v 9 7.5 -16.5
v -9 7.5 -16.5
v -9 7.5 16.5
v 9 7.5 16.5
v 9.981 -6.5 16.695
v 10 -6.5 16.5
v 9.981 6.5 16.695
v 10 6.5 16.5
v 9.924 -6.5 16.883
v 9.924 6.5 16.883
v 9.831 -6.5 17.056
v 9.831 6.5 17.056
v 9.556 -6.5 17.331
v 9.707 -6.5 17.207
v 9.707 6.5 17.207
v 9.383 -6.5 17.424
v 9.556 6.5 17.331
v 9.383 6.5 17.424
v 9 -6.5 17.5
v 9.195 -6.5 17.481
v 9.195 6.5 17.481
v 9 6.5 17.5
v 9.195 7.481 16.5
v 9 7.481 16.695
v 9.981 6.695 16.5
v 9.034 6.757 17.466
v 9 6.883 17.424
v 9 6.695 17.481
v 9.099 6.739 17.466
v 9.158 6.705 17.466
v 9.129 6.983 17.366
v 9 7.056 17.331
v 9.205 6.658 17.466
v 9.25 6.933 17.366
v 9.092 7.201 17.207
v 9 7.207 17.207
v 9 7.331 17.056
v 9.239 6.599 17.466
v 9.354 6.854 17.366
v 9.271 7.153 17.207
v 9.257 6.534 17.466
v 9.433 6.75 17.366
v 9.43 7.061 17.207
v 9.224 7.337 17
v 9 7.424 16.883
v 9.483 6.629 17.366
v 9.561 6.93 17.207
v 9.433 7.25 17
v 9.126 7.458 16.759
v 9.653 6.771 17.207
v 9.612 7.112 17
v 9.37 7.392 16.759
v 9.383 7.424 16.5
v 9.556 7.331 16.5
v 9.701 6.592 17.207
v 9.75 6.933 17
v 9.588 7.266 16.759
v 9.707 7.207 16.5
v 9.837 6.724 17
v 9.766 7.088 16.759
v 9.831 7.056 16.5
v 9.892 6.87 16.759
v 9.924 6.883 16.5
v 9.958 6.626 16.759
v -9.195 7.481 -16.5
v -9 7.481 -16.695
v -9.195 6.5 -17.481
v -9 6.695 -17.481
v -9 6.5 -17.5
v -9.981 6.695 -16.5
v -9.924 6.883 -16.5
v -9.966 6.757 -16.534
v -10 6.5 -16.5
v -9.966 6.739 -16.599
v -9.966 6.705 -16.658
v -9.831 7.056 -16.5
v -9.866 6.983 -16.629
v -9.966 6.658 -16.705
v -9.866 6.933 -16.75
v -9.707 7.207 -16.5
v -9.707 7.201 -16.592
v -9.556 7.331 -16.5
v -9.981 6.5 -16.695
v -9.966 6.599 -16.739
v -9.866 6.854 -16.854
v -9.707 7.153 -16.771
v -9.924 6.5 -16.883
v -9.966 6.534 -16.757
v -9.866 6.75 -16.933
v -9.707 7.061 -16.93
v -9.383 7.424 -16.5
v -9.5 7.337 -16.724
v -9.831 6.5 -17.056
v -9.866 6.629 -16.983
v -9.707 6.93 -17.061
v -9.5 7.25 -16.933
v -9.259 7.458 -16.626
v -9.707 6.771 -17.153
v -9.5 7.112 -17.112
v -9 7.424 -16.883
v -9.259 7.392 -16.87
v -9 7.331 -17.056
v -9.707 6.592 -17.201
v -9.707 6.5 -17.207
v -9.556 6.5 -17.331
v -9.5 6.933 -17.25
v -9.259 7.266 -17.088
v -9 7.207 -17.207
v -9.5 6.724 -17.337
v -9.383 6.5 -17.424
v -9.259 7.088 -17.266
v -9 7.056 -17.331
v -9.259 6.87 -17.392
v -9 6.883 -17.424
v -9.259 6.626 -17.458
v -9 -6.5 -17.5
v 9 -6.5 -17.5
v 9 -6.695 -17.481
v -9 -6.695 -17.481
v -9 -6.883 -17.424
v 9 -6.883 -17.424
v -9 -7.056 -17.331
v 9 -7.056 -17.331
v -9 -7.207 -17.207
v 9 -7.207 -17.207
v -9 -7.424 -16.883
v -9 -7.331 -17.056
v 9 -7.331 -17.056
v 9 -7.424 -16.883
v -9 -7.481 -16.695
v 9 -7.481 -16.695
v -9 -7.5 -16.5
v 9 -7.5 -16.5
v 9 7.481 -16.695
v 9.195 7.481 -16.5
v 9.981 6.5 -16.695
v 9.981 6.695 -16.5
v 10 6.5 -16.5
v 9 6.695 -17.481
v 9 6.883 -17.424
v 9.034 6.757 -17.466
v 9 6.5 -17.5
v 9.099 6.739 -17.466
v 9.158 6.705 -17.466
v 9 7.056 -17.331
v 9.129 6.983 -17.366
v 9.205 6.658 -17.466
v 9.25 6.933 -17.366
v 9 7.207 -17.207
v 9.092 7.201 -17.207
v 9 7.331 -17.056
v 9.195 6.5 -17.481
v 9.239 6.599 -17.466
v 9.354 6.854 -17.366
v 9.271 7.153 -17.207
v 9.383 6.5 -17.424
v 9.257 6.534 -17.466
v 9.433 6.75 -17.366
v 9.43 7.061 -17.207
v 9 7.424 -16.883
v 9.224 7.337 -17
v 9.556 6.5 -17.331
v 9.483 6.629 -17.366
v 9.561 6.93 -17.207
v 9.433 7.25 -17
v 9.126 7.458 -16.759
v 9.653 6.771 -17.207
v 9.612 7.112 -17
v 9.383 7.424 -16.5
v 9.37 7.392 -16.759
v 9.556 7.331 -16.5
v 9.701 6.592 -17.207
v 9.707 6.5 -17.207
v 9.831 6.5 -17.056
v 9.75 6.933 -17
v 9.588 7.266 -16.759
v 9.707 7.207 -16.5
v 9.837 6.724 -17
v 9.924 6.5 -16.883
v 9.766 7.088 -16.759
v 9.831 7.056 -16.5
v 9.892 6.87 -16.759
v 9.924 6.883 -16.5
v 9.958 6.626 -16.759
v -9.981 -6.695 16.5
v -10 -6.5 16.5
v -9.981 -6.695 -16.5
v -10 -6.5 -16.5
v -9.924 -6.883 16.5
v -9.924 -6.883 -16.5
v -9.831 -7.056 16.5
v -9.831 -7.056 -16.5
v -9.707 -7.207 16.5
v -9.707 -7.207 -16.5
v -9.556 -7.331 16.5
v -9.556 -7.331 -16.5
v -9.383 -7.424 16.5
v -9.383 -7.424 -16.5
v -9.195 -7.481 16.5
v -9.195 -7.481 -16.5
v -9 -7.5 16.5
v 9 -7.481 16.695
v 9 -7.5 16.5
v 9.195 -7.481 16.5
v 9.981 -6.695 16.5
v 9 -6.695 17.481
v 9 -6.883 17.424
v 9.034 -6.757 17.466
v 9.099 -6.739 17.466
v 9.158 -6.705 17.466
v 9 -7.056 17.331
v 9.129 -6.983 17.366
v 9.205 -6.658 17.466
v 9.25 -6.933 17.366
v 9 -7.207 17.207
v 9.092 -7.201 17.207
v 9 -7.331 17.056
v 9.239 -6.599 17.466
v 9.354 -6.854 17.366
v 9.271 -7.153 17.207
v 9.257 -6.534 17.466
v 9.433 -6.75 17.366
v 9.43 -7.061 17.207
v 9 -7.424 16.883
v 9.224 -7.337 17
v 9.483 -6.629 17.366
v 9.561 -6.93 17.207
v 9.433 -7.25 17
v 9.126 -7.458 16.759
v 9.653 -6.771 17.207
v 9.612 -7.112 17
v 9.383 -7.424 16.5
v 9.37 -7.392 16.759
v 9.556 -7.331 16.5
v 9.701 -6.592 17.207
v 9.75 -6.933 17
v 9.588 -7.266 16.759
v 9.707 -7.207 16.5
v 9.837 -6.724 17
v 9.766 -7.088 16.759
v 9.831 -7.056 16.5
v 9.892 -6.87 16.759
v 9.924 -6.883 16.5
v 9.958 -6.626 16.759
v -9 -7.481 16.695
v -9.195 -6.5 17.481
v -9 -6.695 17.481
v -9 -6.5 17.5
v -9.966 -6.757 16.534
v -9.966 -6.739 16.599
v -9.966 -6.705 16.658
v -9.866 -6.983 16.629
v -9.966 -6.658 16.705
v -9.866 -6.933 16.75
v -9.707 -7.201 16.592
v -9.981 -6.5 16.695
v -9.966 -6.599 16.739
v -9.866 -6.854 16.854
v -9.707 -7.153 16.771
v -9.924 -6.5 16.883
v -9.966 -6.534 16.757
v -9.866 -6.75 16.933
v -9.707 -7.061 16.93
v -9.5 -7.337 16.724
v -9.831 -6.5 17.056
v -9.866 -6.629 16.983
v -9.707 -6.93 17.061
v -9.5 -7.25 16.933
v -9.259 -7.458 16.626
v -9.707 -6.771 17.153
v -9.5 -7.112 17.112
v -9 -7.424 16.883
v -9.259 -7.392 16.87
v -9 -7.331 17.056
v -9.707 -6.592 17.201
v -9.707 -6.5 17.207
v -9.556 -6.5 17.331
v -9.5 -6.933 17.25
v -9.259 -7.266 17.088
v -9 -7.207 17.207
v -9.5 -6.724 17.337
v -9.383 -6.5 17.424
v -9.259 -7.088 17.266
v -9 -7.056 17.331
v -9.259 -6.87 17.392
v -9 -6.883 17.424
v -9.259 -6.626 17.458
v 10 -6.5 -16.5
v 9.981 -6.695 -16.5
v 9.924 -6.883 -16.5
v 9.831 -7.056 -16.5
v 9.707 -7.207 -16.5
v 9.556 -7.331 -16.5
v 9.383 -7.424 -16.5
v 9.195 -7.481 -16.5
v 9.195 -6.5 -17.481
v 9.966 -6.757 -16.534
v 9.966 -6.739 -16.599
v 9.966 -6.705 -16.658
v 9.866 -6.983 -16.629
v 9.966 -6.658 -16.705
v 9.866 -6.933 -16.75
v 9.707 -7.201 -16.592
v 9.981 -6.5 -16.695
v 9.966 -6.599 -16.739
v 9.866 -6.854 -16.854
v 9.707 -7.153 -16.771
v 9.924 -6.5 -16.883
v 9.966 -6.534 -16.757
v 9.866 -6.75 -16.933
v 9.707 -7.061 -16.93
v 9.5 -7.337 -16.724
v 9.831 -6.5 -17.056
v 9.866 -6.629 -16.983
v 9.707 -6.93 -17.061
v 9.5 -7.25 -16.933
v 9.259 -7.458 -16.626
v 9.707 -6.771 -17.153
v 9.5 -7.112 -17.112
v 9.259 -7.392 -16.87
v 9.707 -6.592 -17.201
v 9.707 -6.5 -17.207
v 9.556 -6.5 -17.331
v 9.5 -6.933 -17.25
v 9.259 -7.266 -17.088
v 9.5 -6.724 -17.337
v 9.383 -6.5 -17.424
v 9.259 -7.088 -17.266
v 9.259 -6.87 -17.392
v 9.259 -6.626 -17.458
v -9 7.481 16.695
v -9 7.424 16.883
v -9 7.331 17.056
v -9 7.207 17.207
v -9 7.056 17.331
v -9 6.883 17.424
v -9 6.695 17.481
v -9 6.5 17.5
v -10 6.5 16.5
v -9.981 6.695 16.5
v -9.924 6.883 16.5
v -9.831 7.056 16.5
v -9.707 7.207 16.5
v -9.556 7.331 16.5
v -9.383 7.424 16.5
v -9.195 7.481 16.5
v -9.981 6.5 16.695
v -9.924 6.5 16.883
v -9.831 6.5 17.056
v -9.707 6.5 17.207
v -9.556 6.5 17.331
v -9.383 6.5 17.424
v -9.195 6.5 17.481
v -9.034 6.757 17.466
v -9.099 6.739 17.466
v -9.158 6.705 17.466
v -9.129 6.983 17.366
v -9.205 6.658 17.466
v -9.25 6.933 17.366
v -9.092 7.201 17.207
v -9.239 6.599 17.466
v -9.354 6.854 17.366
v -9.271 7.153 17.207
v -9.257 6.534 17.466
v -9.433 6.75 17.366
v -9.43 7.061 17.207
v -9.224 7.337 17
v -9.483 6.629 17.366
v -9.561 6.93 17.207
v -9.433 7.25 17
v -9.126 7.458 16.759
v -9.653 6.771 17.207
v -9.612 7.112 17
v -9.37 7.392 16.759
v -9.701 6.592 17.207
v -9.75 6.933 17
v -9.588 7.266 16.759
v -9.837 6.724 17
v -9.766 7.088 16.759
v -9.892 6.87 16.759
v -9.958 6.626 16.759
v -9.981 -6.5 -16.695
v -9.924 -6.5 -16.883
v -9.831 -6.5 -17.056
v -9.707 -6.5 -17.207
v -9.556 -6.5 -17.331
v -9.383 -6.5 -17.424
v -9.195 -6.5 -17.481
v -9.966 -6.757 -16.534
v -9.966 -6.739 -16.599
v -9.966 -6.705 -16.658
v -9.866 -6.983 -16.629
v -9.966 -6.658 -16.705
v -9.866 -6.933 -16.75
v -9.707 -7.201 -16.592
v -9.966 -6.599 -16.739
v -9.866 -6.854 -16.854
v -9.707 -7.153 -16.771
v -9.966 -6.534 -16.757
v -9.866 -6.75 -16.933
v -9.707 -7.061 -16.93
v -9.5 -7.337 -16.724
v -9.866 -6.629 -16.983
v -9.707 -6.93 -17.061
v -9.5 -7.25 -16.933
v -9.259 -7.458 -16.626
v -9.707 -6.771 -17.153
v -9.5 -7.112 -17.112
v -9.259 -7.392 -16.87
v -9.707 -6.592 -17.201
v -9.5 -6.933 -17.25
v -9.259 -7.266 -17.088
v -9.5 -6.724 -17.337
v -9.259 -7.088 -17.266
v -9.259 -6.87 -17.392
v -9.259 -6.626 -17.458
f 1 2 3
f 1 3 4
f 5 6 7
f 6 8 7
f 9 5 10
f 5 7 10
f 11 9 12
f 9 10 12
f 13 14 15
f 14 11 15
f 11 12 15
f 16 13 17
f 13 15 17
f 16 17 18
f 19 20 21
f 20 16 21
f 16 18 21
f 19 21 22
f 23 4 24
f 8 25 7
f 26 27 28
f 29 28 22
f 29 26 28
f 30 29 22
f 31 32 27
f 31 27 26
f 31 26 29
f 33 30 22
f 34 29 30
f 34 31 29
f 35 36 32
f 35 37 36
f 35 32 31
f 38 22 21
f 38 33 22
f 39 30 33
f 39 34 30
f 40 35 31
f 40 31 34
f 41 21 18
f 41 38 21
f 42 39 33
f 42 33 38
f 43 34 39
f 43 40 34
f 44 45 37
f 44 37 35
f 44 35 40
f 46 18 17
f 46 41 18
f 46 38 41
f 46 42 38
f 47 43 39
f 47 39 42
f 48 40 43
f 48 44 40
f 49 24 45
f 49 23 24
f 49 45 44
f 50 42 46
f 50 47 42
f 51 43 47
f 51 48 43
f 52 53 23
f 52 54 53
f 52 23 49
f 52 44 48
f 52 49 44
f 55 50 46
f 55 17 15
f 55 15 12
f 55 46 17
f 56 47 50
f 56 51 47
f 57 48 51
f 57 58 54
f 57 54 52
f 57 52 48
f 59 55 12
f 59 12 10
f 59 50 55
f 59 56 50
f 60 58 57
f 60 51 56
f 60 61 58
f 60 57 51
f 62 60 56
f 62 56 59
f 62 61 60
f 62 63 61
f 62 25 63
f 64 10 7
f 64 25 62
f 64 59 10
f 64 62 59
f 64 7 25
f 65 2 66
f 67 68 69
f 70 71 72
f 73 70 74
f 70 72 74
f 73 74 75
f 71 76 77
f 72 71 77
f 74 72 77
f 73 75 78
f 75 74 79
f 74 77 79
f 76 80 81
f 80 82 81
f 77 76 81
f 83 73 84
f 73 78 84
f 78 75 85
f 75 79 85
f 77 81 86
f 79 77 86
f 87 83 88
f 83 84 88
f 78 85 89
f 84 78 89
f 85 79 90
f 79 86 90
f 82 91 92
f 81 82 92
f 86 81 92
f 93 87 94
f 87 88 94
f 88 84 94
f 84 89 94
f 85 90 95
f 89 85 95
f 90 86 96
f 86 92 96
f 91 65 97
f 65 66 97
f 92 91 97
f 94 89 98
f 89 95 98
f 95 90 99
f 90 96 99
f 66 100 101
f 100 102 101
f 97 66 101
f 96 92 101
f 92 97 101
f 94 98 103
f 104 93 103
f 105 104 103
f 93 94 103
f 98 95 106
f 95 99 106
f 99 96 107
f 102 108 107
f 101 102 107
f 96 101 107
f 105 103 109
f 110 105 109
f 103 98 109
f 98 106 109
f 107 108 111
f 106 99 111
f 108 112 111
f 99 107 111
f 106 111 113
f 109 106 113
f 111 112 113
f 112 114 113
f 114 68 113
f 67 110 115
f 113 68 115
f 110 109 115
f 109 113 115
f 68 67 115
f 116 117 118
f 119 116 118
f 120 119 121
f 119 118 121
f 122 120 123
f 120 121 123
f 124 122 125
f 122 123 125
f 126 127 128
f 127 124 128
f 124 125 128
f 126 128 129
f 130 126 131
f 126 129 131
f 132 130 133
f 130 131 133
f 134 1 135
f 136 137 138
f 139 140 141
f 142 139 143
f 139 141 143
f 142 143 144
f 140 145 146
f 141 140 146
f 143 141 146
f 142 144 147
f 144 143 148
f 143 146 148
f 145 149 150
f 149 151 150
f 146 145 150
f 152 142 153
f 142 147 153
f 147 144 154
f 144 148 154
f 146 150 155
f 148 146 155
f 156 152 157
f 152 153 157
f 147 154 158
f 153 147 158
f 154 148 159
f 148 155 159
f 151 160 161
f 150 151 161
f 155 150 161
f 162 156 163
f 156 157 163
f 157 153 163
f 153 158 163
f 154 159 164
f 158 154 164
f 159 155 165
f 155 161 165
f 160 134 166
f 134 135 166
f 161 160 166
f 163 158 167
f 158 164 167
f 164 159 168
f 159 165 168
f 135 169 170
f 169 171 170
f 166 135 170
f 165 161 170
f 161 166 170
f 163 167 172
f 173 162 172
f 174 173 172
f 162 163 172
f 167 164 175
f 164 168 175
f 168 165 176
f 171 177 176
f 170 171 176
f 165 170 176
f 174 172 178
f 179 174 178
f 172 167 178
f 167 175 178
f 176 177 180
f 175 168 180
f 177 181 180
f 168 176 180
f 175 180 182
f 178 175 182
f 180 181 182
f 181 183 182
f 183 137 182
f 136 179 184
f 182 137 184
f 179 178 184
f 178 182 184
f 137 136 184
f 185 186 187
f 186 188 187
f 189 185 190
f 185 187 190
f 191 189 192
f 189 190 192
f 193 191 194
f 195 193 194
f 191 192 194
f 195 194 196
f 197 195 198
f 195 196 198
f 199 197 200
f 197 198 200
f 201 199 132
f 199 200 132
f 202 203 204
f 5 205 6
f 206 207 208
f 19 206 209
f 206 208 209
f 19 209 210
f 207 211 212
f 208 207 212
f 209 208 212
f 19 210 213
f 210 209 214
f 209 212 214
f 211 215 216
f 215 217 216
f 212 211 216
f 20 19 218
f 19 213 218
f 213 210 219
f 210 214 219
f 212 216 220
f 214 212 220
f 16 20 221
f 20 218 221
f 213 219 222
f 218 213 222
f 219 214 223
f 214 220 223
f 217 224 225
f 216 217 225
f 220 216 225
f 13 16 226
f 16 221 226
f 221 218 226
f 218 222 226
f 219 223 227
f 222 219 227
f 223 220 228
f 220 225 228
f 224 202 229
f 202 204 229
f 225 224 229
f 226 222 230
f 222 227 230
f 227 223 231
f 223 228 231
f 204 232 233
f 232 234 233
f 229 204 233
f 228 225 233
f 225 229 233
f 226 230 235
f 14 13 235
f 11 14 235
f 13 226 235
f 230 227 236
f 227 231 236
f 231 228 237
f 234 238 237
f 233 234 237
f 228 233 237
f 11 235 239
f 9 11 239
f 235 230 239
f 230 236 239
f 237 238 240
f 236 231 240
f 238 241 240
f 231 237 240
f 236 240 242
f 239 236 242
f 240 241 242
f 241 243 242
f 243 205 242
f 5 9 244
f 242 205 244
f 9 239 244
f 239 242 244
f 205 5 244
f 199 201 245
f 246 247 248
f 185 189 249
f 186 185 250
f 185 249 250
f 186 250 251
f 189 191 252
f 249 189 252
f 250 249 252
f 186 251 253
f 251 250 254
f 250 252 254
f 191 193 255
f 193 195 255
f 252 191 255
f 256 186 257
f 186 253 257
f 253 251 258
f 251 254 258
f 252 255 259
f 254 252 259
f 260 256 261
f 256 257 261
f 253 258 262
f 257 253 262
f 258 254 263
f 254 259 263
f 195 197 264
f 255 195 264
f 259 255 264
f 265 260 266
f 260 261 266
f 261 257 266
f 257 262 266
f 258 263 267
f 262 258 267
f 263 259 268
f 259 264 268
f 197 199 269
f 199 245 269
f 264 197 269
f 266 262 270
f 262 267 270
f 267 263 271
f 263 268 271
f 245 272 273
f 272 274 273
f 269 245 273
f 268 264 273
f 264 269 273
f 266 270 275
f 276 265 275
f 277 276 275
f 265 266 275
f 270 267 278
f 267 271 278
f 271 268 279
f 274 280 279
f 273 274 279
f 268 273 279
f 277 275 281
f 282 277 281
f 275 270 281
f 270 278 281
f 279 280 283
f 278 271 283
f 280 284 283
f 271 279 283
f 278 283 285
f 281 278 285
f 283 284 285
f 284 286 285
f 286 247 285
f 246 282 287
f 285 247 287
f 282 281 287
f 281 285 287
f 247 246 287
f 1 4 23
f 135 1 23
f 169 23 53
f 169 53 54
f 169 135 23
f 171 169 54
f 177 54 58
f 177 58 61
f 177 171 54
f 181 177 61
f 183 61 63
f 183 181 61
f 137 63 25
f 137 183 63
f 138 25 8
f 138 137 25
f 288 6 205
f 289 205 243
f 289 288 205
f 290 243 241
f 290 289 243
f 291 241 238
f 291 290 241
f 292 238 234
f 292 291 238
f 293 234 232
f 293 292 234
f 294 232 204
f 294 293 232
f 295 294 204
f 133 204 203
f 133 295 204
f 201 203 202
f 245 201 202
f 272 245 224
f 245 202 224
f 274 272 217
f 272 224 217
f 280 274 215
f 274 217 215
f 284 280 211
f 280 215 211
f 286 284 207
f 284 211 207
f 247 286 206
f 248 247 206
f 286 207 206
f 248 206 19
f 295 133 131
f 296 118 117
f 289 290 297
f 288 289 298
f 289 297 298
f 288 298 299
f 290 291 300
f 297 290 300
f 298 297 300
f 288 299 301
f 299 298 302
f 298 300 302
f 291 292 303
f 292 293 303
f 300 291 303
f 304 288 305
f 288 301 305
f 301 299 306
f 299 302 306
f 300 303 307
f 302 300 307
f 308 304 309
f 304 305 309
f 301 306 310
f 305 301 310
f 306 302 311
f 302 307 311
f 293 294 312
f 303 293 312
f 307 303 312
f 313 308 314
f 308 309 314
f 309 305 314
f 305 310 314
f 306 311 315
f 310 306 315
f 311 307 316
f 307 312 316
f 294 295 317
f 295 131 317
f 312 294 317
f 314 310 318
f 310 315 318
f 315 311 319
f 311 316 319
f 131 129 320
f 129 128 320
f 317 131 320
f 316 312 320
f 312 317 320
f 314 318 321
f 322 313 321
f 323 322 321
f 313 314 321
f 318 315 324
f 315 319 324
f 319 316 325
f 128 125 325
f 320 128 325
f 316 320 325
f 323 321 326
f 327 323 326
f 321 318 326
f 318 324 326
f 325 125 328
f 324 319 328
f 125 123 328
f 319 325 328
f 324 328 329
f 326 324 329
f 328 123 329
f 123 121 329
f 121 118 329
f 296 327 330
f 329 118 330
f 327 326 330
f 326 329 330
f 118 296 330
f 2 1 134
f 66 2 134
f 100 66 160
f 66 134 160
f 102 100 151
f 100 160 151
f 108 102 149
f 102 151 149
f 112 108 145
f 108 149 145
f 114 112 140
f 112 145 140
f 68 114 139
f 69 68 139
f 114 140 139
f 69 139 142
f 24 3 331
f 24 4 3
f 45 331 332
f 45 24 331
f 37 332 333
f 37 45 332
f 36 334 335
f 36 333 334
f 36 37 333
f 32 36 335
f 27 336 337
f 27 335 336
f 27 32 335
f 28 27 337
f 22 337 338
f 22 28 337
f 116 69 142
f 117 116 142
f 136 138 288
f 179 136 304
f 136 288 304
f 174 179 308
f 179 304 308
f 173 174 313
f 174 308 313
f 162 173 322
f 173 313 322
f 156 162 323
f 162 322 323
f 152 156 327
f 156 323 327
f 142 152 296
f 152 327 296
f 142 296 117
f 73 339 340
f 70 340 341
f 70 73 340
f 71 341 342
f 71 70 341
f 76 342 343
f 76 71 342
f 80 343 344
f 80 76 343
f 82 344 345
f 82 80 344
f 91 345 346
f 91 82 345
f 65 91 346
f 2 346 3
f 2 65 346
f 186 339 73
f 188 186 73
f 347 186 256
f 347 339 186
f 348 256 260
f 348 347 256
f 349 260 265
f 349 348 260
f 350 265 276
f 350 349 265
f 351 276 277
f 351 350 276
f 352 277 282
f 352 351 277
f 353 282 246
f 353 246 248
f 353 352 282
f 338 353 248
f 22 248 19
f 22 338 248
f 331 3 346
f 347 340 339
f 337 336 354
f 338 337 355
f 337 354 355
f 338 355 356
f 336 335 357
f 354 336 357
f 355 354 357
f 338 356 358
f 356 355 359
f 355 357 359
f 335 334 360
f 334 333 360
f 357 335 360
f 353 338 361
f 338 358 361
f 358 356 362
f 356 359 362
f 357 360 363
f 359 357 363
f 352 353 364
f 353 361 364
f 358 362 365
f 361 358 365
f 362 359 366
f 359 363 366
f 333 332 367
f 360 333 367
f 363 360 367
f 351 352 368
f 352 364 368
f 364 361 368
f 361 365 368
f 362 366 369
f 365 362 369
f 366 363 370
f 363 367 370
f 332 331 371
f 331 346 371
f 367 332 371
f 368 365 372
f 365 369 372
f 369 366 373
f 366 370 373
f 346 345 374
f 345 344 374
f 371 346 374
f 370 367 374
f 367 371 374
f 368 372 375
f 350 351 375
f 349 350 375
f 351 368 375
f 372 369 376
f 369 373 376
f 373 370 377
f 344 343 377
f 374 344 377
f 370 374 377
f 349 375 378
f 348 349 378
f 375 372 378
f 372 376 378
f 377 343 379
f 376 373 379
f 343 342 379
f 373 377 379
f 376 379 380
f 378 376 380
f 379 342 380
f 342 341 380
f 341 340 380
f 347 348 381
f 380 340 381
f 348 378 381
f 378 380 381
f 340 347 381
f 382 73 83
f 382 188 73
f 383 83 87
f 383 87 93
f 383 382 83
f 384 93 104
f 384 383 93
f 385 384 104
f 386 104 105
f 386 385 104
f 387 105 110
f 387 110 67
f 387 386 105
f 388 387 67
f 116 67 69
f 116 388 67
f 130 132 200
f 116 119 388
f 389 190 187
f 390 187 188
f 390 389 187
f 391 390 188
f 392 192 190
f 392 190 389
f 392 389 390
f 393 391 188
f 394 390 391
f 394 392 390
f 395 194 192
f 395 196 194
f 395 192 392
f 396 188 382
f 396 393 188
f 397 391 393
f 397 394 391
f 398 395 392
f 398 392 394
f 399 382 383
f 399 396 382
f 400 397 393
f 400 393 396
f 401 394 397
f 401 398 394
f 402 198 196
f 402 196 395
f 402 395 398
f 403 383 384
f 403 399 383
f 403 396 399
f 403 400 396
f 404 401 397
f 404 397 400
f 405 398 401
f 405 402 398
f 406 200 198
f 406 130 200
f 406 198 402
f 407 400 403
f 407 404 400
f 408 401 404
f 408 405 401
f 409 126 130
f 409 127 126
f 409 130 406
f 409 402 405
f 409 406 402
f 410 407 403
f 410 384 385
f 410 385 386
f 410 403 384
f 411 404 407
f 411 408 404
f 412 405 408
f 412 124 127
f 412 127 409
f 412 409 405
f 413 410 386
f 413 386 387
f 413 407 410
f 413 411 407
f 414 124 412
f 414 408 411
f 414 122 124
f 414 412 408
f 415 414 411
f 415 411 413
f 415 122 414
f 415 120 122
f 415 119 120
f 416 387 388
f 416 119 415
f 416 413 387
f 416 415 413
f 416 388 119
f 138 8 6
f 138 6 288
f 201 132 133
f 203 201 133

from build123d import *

# Parameters (mm, degrees)
SKICA1_W                = 20
SKICA1_H                = 35
P_IDAT_VYSUNUT_M1_DEPTH = 7.5
ZAOBLIT1_R              = 1


with BuildPart() as part:
    # Skica1 → Přidat vysunutím1 (new, symmetric)
    with BuildSketch(Plane(origin=(0, 0, 0), x_dir=(1, 0, 0), z_dir=(0, 1, 0))):
        Rectangle(SKICA1_W, SKICA1_H)
    extrude(amount=P_IDAT_VYSUNUT_M1_DEPTH, both=True)

    # Zaoblit1
    zaoblit1_edges = [part.edges().sort_by_distance(p)[0] for p in [
        (10, 7.5, 0),
        (0, 7.5, -17.5),
        (-10, 7.5, 0),
        (0, -7.5, -17.5),
        (10, -7.5, 0),
        (0, -7.5, 17.5),
        (-10, -7.5, 0),
        (0, 7.5, 17.5),
        (-10, 0, -17.5),
        (10, 0, -17.5),
        (10, 0, 17.5),
        (-10, 0, 17.5),
    ]]
    fillet(zaoblit1_edges, radius=ZAOBLIT1_R)


solid = part.part
